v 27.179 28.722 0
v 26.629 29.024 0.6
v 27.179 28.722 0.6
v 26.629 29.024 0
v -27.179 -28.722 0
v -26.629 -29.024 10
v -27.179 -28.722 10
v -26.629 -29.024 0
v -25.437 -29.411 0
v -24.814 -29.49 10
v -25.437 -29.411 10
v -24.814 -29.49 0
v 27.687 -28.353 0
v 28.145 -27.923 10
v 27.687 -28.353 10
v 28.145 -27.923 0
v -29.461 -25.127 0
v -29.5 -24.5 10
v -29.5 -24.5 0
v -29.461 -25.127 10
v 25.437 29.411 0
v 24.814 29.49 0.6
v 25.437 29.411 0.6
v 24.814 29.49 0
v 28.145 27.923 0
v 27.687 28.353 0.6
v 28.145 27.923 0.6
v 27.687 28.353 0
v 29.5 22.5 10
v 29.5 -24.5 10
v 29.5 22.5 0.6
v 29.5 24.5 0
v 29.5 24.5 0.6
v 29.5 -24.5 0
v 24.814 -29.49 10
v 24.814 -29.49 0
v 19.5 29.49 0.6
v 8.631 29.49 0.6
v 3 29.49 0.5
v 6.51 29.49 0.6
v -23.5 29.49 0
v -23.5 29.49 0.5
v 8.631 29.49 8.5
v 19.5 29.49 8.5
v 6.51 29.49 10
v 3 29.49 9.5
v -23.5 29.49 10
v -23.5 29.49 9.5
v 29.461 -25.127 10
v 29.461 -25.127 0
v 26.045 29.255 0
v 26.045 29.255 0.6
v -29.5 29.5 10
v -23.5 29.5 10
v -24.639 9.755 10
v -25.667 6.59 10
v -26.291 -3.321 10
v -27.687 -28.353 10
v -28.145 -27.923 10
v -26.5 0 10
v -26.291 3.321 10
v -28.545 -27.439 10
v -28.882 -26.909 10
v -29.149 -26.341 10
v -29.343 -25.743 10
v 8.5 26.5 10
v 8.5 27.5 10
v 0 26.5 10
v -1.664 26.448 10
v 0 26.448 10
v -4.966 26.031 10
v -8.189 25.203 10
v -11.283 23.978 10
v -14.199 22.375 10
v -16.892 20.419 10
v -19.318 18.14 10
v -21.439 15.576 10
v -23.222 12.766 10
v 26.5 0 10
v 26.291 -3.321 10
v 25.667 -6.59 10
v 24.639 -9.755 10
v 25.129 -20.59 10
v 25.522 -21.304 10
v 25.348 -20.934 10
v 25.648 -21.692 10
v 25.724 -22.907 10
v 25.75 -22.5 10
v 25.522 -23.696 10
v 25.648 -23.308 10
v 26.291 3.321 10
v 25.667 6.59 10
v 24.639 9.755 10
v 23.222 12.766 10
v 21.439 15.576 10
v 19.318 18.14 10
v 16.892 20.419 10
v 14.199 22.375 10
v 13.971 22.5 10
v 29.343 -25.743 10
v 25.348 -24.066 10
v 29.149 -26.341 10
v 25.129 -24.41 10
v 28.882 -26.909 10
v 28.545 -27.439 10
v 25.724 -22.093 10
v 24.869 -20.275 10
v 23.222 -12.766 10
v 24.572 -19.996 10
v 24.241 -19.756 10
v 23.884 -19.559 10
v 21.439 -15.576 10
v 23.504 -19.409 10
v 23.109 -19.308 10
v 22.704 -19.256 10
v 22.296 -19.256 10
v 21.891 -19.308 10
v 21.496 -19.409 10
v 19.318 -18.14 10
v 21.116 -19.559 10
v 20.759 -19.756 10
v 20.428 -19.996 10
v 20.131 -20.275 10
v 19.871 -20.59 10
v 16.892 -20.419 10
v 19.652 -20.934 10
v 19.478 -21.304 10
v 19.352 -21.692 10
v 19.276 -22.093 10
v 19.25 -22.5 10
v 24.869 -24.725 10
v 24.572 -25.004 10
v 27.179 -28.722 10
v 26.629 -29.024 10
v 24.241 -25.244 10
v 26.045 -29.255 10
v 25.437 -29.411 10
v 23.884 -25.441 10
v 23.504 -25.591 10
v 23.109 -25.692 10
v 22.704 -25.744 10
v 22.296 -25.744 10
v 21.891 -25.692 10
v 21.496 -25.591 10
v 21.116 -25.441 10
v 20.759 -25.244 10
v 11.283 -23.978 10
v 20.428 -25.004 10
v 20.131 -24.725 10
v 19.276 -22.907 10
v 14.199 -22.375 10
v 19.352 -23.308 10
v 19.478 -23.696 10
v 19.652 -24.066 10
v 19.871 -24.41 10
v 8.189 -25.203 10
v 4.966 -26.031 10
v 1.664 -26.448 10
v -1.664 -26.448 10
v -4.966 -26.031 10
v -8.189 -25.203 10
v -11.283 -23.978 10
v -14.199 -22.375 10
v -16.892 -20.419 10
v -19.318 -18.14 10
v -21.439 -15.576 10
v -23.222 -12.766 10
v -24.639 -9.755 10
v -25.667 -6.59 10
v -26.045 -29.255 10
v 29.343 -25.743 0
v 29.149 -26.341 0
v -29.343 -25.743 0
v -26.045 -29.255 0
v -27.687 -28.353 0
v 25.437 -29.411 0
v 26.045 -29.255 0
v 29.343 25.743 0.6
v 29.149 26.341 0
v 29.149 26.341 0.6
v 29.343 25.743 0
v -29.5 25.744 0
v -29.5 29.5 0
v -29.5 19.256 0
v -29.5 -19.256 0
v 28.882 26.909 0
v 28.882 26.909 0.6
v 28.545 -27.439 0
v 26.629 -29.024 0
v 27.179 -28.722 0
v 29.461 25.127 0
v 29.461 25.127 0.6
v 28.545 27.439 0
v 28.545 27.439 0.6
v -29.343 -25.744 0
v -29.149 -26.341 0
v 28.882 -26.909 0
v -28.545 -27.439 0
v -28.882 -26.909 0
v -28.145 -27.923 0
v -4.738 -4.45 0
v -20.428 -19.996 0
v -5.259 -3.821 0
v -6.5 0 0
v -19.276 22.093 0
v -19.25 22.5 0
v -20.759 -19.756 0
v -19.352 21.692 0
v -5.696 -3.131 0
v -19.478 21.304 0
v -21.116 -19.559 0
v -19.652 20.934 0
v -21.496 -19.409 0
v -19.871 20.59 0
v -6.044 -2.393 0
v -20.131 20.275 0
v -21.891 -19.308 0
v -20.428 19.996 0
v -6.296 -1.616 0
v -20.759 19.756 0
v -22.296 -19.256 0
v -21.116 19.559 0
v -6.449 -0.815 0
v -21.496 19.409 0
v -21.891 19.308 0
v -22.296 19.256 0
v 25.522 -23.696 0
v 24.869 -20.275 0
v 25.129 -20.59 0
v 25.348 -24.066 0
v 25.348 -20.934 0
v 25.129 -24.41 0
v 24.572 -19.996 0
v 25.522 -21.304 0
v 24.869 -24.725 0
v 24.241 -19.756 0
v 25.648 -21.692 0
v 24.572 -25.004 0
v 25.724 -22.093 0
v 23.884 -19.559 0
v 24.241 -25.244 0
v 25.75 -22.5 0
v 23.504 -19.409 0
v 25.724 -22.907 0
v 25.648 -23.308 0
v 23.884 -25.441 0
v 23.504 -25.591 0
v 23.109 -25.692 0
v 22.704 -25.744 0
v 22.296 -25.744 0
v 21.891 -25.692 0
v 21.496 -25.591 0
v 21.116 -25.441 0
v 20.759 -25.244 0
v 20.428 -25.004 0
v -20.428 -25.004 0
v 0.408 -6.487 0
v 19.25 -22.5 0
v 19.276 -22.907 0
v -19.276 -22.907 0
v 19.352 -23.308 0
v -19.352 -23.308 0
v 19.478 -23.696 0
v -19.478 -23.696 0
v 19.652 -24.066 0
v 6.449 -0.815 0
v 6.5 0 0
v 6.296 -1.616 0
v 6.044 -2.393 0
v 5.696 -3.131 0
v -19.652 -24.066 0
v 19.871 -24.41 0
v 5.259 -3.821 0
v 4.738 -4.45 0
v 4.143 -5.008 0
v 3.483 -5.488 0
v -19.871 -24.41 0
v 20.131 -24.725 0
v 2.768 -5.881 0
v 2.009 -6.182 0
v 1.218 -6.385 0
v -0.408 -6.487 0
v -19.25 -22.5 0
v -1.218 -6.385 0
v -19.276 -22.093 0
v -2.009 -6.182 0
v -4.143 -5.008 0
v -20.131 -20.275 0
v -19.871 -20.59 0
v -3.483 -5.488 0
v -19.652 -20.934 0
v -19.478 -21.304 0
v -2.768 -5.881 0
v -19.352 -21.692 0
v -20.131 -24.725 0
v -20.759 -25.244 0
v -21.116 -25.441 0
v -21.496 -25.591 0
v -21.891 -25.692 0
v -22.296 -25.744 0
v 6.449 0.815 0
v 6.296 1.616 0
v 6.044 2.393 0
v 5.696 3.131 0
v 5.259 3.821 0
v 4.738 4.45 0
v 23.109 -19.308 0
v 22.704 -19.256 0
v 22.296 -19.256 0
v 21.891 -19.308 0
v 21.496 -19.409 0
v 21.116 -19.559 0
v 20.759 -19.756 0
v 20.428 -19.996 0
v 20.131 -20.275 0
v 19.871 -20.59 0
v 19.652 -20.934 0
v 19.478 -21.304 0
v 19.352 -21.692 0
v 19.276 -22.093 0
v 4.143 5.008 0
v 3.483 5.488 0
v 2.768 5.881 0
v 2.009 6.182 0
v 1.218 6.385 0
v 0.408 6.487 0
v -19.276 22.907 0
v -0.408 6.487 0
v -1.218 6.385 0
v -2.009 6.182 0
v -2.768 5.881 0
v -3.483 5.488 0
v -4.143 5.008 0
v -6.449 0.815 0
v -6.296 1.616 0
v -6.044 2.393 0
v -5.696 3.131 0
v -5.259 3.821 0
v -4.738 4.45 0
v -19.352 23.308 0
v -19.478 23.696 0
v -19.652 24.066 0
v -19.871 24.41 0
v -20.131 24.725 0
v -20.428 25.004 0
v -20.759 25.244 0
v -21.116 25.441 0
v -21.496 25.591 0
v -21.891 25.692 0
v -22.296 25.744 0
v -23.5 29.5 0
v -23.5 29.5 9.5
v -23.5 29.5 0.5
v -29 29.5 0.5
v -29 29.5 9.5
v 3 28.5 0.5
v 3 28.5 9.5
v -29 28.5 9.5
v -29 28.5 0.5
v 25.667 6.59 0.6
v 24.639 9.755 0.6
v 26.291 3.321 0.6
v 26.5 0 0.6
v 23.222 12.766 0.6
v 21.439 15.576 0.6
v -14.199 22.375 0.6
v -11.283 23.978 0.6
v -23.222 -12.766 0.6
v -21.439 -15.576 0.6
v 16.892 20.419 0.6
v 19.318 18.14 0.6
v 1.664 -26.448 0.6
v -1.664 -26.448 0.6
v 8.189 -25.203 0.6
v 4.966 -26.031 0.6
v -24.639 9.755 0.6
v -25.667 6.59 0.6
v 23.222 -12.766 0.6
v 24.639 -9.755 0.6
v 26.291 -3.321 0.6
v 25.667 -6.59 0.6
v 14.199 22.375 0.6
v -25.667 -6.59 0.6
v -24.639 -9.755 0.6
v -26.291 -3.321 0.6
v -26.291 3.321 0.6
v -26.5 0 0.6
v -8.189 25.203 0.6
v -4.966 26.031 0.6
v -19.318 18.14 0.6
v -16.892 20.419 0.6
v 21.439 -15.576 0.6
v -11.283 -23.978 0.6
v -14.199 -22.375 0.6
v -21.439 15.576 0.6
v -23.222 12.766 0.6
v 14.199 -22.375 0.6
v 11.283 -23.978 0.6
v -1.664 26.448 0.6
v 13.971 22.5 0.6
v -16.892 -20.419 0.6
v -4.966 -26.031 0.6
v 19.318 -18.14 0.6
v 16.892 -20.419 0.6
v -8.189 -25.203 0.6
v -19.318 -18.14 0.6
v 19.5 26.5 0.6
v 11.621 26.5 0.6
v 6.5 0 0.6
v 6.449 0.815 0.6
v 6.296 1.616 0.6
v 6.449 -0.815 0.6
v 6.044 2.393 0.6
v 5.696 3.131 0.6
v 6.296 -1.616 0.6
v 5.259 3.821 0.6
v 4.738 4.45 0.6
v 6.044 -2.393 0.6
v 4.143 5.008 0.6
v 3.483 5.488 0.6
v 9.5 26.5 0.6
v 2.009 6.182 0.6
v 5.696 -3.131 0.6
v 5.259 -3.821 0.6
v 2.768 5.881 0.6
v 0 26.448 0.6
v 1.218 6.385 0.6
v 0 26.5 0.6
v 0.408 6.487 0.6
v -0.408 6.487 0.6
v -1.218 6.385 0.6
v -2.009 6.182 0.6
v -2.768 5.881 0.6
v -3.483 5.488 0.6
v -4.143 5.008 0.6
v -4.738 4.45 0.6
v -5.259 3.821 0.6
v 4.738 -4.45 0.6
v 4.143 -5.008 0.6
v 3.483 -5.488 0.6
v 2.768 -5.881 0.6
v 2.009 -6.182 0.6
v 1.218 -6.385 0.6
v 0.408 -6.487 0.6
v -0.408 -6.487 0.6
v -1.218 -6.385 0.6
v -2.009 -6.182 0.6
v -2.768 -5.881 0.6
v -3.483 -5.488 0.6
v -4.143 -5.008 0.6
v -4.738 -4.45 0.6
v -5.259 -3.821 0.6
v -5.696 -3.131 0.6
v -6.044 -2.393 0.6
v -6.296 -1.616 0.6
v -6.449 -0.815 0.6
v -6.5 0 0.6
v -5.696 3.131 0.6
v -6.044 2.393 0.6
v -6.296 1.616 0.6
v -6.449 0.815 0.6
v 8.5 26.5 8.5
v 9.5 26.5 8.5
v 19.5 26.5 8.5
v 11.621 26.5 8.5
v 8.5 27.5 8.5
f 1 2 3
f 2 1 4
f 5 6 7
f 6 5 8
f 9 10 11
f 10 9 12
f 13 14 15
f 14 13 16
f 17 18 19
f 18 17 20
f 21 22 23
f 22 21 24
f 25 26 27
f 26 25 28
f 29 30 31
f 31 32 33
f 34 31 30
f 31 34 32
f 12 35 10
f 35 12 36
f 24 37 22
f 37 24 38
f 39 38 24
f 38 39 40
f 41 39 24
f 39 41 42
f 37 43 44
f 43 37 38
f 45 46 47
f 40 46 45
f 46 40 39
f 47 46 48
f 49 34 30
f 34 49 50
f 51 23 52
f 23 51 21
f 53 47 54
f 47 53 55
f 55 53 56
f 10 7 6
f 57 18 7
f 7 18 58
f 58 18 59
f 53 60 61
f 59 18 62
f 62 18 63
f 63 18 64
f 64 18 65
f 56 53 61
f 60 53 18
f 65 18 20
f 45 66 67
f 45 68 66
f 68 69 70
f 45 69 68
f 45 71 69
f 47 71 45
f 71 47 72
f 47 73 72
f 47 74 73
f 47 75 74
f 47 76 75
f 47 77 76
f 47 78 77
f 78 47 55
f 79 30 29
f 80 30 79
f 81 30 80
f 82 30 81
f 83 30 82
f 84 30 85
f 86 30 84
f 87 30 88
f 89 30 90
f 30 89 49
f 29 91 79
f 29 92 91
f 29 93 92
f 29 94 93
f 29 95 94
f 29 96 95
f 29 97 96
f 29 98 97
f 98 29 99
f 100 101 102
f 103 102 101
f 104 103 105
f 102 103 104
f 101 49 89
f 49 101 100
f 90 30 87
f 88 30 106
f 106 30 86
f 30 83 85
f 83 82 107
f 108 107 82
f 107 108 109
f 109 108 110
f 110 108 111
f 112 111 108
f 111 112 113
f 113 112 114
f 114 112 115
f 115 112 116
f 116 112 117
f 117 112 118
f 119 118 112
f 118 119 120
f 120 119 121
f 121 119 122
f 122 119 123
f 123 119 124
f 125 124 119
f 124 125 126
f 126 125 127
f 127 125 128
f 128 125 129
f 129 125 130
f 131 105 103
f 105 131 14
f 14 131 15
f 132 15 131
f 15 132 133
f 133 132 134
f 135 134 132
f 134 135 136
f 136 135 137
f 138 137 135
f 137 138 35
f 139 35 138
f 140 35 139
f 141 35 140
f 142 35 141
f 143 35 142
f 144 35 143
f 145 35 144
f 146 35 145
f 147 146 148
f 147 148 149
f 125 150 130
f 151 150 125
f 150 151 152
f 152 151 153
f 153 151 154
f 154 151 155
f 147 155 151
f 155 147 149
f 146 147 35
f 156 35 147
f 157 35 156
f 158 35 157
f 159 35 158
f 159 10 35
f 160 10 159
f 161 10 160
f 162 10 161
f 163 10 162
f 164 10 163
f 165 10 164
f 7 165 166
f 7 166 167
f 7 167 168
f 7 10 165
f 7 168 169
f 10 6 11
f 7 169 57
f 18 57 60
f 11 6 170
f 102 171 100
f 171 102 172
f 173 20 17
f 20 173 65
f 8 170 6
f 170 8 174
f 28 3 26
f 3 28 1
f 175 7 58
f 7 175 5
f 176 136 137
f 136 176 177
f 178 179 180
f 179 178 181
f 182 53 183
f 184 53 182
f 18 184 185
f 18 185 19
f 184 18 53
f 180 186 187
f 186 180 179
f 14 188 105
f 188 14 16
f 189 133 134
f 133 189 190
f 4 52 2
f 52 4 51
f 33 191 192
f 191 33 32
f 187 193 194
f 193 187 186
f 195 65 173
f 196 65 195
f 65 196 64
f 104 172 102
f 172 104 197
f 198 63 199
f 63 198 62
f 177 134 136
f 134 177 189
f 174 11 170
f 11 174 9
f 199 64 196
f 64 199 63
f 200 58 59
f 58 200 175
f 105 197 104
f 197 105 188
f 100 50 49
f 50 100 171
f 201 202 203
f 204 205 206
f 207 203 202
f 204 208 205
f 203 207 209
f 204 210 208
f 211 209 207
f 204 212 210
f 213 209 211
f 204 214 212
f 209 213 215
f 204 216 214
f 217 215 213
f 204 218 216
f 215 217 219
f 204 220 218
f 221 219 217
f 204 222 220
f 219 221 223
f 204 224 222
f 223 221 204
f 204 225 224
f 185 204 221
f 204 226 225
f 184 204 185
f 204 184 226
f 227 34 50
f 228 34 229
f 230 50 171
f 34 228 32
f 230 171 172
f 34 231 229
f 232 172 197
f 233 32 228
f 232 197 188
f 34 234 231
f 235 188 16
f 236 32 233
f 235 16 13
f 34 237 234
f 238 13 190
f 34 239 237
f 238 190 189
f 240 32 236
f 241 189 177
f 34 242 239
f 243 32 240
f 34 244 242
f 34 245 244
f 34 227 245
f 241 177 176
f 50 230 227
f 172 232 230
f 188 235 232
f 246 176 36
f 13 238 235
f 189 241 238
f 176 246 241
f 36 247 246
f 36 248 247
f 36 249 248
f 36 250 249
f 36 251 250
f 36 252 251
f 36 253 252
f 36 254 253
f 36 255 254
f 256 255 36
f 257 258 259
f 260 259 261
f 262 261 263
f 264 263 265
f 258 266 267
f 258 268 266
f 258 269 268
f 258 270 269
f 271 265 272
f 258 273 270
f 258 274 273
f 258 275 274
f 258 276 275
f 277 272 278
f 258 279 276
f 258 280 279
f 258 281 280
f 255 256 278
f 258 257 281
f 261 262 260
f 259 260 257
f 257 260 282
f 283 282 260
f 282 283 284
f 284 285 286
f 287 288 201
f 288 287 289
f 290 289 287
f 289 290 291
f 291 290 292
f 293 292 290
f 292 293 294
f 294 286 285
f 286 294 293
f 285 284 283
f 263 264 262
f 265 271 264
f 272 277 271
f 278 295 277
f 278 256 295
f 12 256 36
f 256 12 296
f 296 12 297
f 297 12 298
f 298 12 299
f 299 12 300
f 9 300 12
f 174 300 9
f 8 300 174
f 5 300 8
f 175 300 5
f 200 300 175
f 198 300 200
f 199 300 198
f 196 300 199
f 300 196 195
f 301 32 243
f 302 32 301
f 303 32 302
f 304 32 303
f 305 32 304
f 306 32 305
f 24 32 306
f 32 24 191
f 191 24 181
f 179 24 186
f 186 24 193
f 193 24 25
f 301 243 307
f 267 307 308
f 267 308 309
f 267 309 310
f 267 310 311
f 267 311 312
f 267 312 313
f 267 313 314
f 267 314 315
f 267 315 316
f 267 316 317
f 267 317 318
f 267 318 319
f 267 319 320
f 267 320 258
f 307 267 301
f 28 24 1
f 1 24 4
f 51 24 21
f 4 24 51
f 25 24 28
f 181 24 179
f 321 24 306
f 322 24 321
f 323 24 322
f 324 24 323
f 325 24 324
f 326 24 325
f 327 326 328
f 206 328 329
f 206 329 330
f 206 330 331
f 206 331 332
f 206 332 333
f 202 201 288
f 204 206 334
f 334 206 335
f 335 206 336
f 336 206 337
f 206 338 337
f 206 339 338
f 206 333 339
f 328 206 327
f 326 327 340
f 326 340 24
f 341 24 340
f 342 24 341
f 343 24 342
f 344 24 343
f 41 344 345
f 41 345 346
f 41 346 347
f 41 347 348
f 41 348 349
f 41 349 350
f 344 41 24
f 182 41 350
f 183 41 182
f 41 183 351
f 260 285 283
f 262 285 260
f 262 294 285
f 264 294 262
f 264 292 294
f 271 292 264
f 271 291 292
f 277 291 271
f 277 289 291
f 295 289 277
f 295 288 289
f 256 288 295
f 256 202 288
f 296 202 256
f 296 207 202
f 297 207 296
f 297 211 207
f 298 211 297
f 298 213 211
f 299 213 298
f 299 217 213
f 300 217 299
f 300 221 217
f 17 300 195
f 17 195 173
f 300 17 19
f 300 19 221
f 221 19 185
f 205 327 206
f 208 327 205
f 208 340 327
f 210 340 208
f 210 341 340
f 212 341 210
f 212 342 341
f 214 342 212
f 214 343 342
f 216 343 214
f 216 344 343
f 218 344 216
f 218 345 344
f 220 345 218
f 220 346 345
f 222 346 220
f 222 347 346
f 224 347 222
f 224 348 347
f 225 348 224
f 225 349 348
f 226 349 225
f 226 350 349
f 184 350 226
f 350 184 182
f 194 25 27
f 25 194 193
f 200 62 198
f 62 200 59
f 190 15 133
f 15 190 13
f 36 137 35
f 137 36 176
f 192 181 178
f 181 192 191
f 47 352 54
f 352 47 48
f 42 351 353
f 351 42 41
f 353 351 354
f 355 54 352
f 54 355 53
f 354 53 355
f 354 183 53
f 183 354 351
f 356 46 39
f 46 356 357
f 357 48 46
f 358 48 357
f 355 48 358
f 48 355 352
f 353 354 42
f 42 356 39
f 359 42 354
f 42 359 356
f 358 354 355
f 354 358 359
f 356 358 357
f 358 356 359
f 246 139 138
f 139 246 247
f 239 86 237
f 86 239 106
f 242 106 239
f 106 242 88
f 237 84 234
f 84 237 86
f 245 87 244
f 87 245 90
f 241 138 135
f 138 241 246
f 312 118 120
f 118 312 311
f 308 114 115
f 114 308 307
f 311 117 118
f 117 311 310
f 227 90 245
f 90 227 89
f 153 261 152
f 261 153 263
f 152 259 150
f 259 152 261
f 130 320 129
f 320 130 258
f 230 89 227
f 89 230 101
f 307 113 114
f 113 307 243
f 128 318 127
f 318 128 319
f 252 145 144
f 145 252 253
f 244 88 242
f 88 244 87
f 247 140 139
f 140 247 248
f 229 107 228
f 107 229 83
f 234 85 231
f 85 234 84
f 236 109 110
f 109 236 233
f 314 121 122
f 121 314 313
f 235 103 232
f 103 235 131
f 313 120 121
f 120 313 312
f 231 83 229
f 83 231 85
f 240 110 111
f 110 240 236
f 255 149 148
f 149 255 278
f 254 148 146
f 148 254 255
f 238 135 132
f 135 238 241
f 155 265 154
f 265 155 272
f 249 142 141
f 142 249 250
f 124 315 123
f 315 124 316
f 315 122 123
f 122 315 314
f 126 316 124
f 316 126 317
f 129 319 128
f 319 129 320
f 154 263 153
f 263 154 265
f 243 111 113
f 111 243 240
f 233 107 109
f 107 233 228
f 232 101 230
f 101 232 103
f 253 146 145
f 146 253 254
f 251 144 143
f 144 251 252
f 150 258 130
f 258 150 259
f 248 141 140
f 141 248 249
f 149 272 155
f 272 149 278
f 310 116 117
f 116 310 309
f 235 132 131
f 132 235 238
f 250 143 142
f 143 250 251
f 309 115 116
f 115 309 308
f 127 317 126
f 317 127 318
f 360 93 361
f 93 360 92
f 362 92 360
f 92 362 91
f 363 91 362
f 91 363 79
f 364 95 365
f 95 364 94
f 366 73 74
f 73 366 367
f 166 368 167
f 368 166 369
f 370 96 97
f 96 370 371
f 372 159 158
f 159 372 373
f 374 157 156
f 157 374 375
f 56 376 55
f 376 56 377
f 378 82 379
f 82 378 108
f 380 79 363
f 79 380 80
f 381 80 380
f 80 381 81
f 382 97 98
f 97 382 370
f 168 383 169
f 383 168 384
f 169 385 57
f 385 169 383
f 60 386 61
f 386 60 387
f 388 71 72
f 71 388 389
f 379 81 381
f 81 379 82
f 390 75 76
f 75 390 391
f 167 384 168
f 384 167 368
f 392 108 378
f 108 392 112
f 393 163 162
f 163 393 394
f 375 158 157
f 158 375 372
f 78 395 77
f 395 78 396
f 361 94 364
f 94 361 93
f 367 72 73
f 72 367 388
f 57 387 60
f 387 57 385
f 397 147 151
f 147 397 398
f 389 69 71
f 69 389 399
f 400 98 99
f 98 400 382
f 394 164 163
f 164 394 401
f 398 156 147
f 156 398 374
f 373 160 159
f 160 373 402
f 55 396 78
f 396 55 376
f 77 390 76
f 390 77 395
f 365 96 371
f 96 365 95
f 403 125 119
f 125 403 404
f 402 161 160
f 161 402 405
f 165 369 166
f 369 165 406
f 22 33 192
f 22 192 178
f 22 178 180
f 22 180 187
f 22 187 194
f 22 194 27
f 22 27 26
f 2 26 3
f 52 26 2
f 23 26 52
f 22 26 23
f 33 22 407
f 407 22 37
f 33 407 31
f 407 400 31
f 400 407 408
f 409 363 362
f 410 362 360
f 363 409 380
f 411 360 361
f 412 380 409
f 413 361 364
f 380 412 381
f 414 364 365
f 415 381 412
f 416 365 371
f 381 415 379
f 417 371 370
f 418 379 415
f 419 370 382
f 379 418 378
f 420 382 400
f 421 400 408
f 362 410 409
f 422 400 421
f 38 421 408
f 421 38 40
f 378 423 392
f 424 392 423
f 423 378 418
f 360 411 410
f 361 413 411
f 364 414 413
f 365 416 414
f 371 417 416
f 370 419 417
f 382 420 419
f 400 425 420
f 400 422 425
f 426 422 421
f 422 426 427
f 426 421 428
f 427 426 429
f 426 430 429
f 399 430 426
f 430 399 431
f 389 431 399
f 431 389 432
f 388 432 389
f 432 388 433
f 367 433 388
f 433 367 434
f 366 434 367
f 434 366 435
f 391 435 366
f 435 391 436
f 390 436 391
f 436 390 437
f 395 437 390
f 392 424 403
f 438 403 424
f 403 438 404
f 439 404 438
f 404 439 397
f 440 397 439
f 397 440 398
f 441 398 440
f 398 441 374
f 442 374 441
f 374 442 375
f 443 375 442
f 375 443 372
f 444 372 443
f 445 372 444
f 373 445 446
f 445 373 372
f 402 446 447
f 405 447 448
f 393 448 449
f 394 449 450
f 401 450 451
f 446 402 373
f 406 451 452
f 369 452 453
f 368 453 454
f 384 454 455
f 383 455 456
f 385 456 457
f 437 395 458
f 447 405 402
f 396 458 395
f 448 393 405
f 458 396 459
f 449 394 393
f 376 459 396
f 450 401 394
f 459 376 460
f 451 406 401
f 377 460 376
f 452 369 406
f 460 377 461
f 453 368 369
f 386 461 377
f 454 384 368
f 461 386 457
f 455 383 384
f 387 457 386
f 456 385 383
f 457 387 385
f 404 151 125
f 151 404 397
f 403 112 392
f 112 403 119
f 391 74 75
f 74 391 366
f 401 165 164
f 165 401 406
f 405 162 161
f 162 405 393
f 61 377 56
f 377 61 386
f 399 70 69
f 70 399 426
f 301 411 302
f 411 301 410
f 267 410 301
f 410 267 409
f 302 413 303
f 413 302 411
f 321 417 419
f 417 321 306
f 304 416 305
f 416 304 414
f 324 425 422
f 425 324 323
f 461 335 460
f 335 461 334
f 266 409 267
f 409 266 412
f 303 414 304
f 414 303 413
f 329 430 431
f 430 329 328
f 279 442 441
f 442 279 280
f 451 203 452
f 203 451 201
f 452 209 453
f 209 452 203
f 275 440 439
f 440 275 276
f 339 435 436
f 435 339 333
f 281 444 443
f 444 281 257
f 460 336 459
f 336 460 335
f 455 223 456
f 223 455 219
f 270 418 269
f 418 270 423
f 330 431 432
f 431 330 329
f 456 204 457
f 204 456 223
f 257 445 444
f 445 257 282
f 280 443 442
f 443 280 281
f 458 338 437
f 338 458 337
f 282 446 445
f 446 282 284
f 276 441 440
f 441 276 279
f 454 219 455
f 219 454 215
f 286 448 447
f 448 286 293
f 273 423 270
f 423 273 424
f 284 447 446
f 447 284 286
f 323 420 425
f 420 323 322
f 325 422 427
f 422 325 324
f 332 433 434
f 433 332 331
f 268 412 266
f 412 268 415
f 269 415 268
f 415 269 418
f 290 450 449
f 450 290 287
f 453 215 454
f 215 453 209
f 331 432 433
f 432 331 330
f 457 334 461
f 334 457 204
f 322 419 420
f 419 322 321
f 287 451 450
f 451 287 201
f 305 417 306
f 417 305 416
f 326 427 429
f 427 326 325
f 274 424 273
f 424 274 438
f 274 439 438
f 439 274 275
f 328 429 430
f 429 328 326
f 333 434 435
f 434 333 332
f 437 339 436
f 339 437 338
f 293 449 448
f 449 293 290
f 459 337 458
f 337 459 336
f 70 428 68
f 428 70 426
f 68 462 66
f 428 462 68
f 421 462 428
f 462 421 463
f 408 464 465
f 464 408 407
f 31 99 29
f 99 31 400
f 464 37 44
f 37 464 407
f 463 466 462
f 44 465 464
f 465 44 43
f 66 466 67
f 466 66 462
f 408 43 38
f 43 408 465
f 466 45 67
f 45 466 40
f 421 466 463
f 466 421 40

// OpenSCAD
$fn = 50;


difference() {
	union() {
		hull() {
			translate(v = [-24.5000000000, 24.5000000000, 0]) {
				cylinder(h = 10, r = 5);
			}
			translate(v = [24.5000000000, 24.5000000000, 0]) {
				cylinder(h = 10, r = 5);
			}
			translate(v = [-24.5000000000, -24.5000000000, 0]) {
				cylinder(h = 10, r = 5);
			}
			translate(v = [24.5000000000, -24.5000000000, 0]) {
				cylinder(h = 10, r = 5);
			}
		}
		translate(v = [-29.5000000000, 23.5000000000, 0]) {
			cube(size = [6, 6, 10]);
		}
	}
	union() {
		translate(v = [-30.0000000000, -22.5000000000, -250.0000000000]) {
			rotate(a = [0, 0, 0]) {
				difference() {
					union() {
						hull() {
							translate(v = [7.5000000000, 0, 0]) {
								cylinder(h = 250, r = 3.2500000000, r1 = 3.2500000000, r2 = 3.2500000000);
							}
							translate(v = [-7.5000000000, 0, 0]) {
								cylinder(h = 250, r = 3.2500000000, r1 = 3.2500000000, r2 = 3.2500000000);
							}
						}
					}
					union();
				}
			}
		}
		translate(v = [-30.0000000000, 22.5000000000, -250.0000000000]) {
			rotate(a = [0, 0, 0]) {
				difference() {
					union() {
						hull() {
							translate(v = [7.5000000000, 0, 0]) {
								cylinder(h = 250, r = 3.2500000000, r1 = 3.2500000000, r2 = 3.2500000000);
							}
							translate(v = [-7.5000000000, 0, 0]) {
								cylinder(h = 250, r = 3.2500000000, r1 = 3.2500000000, r2 = 3.2500000000);
							}
						}
					}
					union();
				}
			}
		}
		translate(v = [-29.0000000000, 28.5000000000, 0.5000000000]) {
			cube(size = [32, 1, 9.0000000000]);
		}
		translate(v = [22.5000000000, -22.5000000000, -50.0000000000]) {
			cylinder(h = 100, r = 3.2500000000);
		}
		translate(v = [0, 0, 0.6000000000]) {
			cylinder(h = 12.4000000000, r = 26.5000000000);
		}
		translate(v = [0, 0, -5.0000000000]) {
			cylinder(h = 10, r = 6.5000000000);
		}
		translate(v = [0.0000000000, 22.5000000000, 0.6000000000]) {
			cube(size = [29.5000000000, 4, 12.4000000000]);
		}
		translate(v = [19.5000000000, 22.5000000000, 0.6000000000]) {
			cube(size = [10, 7, 12.4000000000]);
		}
		translate(v = [8.5000000000, 22.5000000000, 8.5000000000]) {
			cube(size = [21, 7, 1.5000000000]);
		}
		translate(v = [5.7500000000, 30.2500000000, 0.6000000000]) {
			rotate(a = [0, 0, -45]) {
				cube(size = [7.5000000000, 1.5000000000, 12.4000000000]);
			}
		}
		translate(v = [5.0610000000, 20.5000000000, 0.6000000000]) {
			cube(size = [7.5000000000, 2, 9.4000000000]);
		}
	}
}
